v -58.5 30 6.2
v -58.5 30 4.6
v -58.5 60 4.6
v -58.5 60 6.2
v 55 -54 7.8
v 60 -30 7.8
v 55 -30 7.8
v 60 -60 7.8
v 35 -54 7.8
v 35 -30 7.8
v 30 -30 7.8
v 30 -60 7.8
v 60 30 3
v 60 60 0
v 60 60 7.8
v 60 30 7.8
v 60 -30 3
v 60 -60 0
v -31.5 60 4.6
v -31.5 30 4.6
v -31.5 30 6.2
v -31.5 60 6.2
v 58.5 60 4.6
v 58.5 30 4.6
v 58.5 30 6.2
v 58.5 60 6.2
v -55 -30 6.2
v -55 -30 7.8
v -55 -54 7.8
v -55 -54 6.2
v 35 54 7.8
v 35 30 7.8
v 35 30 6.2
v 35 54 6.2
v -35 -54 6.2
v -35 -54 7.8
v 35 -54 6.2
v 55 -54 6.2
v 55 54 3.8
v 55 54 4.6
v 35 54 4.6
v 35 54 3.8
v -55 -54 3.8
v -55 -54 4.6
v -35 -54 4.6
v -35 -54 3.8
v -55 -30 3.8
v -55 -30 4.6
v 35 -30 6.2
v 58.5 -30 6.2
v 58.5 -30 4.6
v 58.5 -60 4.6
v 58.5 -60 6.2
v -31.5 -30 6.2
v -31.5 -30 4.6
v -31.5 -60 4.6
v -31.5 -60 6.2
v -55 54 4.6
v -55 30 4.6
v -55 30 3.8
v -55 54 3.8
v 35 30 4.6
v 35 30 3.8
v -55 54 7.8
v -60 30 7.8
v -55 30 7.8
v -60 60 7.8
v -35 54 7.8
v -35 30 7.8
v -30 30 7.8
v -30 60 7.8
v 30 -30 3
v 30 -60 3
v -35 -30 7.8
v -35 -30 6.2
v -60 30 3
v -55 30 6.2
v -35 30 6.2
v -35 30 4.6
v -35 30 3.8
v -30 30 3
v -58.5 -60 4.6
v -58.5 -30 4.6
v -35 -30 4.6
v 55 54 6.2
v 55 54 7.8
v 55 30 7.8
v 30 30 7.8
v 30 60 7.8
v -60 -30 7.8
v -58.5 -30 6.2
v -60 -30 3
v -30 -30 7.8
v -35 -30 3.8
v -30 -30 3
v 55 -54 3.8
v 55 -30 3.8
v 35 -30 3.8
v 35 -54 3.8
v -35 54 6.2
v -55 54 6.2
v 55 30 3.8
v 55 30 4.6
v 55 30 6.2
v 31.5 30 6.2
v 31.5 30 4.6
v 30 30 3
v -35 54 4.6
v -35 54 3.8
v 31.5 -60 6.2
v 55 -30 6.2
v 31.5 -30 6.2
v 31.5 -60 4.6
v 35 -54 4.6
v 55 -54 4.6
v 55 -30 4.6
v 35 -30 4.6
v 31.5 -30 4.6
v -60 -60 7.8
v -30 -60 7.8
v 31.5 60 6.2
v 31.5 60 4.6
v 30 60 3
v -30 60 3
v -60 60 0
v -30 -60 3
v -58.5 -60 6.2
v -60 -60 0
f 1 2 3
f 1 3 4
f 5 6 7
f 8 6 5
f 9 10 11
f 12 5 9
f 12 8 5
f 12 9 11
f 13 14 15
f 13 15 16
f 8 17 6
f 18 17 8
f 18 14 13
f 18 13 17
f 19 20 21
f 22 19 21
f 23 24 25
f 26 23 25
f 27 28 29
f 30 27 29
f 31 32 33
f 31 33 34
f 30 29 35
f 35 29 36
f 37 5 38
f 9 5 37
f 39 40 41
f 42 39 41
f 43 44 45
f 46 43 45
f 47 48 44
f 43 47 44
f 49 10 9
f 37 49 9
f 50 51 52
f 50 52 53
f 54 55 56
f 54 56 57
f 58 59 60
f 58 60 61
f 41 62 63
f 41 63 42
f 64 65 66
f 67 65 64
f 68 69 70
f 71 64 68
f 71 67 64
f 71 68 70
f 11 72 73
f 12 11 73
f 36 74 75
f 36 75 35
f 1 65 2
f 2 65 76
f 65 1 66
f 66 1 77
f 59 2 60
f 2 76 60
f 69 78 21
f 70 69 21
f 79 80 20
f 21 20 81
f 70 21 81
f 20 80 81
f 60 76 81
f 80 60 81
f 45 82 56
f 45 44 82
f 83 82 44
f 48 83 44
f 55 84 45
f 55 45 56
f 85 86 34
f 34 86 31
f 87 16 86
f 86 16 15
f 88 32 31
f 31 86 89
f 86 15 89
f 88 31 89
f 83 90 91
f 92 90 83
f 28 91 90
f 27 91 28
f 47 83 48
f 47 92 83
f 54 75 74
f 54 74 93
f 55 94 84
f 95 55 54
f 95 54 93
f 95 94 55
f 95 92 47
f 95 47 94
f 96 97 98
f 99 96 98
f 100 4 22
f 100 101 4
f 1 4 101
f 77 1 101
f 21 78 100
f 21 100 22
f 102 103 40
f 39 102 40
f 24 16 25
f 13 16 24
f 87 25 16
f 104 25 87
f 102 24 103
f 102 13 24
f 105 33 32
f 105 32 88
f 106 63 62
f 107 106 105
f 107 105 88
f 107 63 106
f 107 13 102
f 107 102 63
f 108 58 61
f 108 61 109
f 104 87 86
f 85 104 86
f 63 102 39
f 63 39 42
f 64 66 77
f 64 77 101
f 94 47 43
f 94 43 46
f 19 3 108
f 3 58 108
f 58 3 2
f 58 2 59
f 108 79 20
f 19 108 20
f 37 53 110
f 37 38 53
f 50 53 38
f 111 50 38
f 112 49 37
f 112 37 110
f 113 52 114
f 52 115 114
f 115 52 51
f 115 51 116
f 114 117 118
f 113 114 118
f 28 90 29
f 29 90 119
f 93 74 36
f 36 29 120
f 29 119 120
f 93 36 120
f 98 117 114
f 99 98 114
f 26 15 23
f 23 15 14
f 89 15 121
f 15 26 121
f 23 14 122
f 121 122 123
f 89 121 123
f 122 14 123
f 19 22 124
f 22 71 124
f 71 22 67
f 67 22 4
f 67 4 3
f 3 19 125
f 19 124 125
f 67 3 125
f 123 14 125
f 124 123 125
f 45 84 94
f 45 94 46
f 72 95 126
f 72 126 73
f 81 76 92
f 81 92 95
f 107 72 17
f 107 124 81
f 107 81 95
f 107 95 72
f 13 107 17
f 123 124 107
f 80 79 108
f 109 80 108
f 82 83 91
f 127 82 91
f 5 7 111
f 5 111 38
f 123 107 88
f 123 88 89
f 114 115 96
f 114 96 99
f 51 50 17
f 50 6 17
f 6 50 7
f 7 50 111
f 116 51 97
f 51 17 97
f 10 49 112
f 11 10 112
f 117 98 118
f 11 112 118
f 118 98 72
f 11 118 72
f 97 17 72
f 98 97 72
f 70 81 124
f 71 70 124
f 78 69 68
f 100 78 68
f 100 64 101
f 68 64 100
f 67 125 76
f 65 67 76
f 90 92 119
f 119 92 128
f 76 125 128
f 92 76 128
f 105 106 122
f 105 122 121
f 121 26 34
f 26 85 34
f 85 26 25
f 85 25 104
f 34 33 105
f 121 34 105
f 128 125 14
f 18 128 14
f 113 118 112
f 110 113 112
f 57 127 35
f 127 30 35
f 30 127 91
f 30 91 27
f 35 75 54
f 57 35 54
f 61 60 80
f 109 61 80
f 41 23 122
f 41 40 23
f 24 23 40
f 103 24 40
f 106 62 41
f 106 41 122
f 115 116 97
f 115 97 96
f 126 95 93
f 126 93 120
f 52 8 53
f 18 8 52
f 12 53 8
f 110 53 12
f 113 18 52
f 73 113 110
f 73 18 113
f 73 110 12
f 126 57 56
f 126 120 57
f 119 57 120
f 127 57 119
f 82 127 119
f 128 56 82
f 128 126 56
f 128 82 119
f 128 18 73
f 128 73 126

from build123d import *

# Parameters (mm, degrees)
SKETCH_W           = 120
SKETCH_H           = 120
PAD_DEPTH          = 3
SKETCH001_W        = 30
SKETCH001_H        = 30
PAD001_DEPTH       = 4.8
SKETCH002_W        = 27
SKETCH002_H        = 1.6
POCKET_DEPTH       = 369.770569
SKETCH003_W        = 20
SKETCH003_H        = 24
POCKET001_DEPTH    = 4
POLARPATTERN_COUNT = 2


with BuildPart() as part:
    # Sketch → Pad (new body)
    with BuildSketch(Plane.XY):
        Rectangle(SKETCH_W, SKETCH_H)
    extrude(amount=PAD_DEPTH)

    # Sketch001 (on Face6 of Pad) → Pad001 (join)
    with BuildSketch(Plane.XY.offset(3)):
        with Locations((-45, 45)):
            Rectangle(SKETCH001_W, SKETCH001_H)
    pad001 = extrude(amount=PAD001_DEPTH)

    # Sketch002 (on Face7 of Pad001) → Pocket (cut, through all)
    with BuildSketch(Plane.XZ.offset(-30)):
        with Locations((-45, 5.4)):
            Rectangle(SKETCH002_W, SKETCH002_H)
    pocket = extrude(amount=-POCKET_DEPTH, mode=Mode.SUBTRACT)

    # Sketch003 (on Face7 of Pocket) → Pocket001 (cut)
    with BuildSketch(Plane.XY.offset(7.8)):
        with Locations((-45, 42)):
            Rectangle(SKETCH003_W, SKETCH003_H)
    pocket001 = extrude(amount=-POCKET001_DEPTH, mode=Mode.SUBTRACT)

    # Mirrored: Pad001, Pocket, Pocket001 across Sketch001 V_Axis
    add(pad001.mirror(Plane(origin=(0, 0, 3), x_dir=(0, 0, 1), z_dir=(1, 0, 0))))
    add(pocket.mirror(Plane(origin=(0, 0, 3), x_dir=(0, 0, 1), z_dir=(1, 0, 0))), mode=Mode.SUBTRACT)
    add(pocket001.mirror(Plane(origin=(0, 0, 3), x_dir=(0, 0, 1), z_dir=(1, 0, 0))), mode=Mode.SUBTRACT)

    # Mirrored001: Pad001, Pocket, Pocket001 across Sketch001 H_Axis
    add(pad001.mirror(Plane(origin=(0, 0, 3), x_dir=(0, 0, 1), z_dir=(0, 1, 0))))
    add(pocket.mirror(Plane(origin=(0, 0, 3), x_dir=(0, 0, 1), z_dir=(0, 1, 0))), mode=Mode.SUBTRACT)
    add(pocket001.mirror(Plane(origin=(0, 0, 3), x_dir=(0, 0, 1), z_dir=(0, 1, 0))), mode=Mode.SUBTRACT)

    # PolarPattern: Pad001, Pocket, Pocket001 ×2 about axis
    polarpattern_axis = Axis((0, 0, 3), (0, 0, 1))
    for i in range(1, POLARPATTERN_COUNT):
        add(pad001.rotate(polarpattern_axis, i * 360 / POLARPATTERN_COUNT))
        add(pocket.rotate(polarpattern_axis, i * 360 / POLARPATTERN_COUNT), mode=Mode.SUBTRACT)
        add(pocket001.rotate(polarpattern_axis, i * 360 / POLARPATTERN_COUNT), mode=Mode.SUBTRACT)


solid = part.part
